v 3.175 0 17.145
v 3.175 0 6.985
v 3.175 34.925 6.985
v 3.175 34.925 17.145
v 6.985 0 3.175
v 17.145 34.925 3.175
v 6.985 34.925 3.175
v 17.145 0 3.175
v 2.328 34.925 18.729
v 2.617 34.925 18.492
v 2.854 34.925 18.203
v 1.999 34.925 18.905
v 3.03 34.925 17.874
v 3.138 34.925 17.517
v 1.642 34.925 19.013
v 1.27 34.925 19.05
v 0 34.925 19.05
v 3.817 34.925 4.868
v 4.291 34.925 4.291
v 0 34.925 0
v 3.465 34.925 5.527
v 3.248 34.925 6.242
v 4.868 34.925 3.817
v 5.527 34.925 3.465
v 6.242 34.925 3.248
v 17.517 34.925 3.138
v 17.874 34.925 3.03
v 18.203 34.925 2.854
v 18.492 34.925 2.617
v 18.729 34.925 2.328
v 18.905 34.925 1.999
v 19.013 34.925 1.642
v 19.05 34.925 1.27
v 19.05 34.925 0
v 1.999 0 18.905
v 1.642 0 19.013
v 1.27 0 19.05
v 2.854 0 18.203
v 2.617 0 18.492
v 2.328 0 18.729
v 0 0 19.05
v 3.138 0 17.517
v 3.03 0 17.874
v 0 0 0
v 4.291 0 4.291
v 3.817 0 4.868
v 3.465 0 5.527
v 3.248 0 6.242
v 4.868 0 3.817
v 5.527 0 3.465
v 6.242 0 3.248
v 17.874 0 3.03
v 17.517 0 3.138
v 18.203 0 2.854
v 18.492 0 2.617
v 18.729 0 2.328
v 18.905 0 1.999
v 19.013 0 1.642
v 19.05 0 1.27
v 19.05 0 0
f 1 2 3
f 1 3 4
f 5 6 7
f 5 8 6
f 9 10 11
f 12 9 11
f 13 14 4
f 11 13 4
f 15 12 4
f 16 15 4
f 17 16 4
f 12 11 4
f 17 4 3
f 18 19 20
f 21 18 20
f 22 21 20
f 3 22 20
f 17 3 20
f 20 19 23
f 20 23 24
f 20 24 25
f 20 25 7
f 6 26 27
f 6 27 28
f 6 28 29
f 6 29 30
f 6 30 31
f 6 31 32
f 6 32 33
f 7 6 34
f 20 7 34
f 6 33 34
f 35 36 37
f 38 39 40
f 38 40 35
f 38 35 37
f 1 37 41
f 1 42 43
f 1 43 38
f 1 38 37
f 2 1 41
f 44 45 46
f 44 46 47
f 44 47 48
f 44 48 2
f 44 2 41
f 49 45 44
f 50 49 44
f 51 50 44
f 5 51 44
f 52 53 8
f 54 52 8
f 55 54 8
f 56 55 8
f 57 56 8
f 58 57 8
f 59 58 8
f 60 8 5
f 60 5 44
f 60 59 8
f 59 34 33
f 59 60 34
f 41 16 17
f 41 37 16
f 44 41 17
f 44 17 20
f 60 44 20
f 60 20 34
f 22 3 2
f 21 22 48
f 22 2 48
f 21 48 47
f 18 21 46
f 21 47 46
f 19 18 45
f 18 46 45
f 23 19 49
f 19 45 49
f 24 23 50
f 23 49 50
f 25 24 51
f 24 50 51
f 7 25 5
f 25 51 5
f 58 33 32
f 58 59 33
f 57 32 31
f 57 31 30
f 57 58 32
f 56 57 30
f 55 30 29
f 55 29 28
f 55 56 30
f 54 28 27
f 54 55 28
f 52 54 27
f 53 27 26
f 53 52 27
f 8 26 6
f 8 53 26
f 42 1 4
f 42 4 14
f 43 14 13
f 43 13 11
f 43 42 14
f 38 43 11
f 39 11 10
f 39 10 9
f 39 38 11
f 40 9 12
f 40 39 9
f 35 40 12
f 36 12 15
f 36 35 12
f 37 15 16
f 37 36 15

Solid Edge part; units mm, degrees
sketch "Sketch1" plane through (0, 0, 0) normal (0, -1, 0) x (1, 0, 0)
  line L0 (0, 19.05) -> (0, 0)
  line L1 (0, 0) -> (19.05, 0)
  line L2 (19.05, 0) -> (19.05, 1.27)
  arc A0 (19.05, 1.27) -> (17.145, 3.175) centre (17.145, 1.27) ccw
  line L3 (17.145, 3.175) -> (6.985, 3.175)
  arc A1 (6.985, 3.175) -> (3.175, 6.985) centre (6.985, 6.985) cw
  line L4 (3.175, 6.985) -> (3.175, 17.145)
  arc A2 (3.175, 17.145) -> (1.27, 19.05) centre (1.27, 17.145) ccw
  line L5 (1.27, 19.05) -> (0, 19.05)
  dimension "D1" = 19.05
  dimension "D2" = 1.905
  dimension "D3" = 3.81
  dimension "D4" = 3.175
extrude "Protrusion1" add sketch "Sketch1" against normal blind 34.925
properties material "Steel"
